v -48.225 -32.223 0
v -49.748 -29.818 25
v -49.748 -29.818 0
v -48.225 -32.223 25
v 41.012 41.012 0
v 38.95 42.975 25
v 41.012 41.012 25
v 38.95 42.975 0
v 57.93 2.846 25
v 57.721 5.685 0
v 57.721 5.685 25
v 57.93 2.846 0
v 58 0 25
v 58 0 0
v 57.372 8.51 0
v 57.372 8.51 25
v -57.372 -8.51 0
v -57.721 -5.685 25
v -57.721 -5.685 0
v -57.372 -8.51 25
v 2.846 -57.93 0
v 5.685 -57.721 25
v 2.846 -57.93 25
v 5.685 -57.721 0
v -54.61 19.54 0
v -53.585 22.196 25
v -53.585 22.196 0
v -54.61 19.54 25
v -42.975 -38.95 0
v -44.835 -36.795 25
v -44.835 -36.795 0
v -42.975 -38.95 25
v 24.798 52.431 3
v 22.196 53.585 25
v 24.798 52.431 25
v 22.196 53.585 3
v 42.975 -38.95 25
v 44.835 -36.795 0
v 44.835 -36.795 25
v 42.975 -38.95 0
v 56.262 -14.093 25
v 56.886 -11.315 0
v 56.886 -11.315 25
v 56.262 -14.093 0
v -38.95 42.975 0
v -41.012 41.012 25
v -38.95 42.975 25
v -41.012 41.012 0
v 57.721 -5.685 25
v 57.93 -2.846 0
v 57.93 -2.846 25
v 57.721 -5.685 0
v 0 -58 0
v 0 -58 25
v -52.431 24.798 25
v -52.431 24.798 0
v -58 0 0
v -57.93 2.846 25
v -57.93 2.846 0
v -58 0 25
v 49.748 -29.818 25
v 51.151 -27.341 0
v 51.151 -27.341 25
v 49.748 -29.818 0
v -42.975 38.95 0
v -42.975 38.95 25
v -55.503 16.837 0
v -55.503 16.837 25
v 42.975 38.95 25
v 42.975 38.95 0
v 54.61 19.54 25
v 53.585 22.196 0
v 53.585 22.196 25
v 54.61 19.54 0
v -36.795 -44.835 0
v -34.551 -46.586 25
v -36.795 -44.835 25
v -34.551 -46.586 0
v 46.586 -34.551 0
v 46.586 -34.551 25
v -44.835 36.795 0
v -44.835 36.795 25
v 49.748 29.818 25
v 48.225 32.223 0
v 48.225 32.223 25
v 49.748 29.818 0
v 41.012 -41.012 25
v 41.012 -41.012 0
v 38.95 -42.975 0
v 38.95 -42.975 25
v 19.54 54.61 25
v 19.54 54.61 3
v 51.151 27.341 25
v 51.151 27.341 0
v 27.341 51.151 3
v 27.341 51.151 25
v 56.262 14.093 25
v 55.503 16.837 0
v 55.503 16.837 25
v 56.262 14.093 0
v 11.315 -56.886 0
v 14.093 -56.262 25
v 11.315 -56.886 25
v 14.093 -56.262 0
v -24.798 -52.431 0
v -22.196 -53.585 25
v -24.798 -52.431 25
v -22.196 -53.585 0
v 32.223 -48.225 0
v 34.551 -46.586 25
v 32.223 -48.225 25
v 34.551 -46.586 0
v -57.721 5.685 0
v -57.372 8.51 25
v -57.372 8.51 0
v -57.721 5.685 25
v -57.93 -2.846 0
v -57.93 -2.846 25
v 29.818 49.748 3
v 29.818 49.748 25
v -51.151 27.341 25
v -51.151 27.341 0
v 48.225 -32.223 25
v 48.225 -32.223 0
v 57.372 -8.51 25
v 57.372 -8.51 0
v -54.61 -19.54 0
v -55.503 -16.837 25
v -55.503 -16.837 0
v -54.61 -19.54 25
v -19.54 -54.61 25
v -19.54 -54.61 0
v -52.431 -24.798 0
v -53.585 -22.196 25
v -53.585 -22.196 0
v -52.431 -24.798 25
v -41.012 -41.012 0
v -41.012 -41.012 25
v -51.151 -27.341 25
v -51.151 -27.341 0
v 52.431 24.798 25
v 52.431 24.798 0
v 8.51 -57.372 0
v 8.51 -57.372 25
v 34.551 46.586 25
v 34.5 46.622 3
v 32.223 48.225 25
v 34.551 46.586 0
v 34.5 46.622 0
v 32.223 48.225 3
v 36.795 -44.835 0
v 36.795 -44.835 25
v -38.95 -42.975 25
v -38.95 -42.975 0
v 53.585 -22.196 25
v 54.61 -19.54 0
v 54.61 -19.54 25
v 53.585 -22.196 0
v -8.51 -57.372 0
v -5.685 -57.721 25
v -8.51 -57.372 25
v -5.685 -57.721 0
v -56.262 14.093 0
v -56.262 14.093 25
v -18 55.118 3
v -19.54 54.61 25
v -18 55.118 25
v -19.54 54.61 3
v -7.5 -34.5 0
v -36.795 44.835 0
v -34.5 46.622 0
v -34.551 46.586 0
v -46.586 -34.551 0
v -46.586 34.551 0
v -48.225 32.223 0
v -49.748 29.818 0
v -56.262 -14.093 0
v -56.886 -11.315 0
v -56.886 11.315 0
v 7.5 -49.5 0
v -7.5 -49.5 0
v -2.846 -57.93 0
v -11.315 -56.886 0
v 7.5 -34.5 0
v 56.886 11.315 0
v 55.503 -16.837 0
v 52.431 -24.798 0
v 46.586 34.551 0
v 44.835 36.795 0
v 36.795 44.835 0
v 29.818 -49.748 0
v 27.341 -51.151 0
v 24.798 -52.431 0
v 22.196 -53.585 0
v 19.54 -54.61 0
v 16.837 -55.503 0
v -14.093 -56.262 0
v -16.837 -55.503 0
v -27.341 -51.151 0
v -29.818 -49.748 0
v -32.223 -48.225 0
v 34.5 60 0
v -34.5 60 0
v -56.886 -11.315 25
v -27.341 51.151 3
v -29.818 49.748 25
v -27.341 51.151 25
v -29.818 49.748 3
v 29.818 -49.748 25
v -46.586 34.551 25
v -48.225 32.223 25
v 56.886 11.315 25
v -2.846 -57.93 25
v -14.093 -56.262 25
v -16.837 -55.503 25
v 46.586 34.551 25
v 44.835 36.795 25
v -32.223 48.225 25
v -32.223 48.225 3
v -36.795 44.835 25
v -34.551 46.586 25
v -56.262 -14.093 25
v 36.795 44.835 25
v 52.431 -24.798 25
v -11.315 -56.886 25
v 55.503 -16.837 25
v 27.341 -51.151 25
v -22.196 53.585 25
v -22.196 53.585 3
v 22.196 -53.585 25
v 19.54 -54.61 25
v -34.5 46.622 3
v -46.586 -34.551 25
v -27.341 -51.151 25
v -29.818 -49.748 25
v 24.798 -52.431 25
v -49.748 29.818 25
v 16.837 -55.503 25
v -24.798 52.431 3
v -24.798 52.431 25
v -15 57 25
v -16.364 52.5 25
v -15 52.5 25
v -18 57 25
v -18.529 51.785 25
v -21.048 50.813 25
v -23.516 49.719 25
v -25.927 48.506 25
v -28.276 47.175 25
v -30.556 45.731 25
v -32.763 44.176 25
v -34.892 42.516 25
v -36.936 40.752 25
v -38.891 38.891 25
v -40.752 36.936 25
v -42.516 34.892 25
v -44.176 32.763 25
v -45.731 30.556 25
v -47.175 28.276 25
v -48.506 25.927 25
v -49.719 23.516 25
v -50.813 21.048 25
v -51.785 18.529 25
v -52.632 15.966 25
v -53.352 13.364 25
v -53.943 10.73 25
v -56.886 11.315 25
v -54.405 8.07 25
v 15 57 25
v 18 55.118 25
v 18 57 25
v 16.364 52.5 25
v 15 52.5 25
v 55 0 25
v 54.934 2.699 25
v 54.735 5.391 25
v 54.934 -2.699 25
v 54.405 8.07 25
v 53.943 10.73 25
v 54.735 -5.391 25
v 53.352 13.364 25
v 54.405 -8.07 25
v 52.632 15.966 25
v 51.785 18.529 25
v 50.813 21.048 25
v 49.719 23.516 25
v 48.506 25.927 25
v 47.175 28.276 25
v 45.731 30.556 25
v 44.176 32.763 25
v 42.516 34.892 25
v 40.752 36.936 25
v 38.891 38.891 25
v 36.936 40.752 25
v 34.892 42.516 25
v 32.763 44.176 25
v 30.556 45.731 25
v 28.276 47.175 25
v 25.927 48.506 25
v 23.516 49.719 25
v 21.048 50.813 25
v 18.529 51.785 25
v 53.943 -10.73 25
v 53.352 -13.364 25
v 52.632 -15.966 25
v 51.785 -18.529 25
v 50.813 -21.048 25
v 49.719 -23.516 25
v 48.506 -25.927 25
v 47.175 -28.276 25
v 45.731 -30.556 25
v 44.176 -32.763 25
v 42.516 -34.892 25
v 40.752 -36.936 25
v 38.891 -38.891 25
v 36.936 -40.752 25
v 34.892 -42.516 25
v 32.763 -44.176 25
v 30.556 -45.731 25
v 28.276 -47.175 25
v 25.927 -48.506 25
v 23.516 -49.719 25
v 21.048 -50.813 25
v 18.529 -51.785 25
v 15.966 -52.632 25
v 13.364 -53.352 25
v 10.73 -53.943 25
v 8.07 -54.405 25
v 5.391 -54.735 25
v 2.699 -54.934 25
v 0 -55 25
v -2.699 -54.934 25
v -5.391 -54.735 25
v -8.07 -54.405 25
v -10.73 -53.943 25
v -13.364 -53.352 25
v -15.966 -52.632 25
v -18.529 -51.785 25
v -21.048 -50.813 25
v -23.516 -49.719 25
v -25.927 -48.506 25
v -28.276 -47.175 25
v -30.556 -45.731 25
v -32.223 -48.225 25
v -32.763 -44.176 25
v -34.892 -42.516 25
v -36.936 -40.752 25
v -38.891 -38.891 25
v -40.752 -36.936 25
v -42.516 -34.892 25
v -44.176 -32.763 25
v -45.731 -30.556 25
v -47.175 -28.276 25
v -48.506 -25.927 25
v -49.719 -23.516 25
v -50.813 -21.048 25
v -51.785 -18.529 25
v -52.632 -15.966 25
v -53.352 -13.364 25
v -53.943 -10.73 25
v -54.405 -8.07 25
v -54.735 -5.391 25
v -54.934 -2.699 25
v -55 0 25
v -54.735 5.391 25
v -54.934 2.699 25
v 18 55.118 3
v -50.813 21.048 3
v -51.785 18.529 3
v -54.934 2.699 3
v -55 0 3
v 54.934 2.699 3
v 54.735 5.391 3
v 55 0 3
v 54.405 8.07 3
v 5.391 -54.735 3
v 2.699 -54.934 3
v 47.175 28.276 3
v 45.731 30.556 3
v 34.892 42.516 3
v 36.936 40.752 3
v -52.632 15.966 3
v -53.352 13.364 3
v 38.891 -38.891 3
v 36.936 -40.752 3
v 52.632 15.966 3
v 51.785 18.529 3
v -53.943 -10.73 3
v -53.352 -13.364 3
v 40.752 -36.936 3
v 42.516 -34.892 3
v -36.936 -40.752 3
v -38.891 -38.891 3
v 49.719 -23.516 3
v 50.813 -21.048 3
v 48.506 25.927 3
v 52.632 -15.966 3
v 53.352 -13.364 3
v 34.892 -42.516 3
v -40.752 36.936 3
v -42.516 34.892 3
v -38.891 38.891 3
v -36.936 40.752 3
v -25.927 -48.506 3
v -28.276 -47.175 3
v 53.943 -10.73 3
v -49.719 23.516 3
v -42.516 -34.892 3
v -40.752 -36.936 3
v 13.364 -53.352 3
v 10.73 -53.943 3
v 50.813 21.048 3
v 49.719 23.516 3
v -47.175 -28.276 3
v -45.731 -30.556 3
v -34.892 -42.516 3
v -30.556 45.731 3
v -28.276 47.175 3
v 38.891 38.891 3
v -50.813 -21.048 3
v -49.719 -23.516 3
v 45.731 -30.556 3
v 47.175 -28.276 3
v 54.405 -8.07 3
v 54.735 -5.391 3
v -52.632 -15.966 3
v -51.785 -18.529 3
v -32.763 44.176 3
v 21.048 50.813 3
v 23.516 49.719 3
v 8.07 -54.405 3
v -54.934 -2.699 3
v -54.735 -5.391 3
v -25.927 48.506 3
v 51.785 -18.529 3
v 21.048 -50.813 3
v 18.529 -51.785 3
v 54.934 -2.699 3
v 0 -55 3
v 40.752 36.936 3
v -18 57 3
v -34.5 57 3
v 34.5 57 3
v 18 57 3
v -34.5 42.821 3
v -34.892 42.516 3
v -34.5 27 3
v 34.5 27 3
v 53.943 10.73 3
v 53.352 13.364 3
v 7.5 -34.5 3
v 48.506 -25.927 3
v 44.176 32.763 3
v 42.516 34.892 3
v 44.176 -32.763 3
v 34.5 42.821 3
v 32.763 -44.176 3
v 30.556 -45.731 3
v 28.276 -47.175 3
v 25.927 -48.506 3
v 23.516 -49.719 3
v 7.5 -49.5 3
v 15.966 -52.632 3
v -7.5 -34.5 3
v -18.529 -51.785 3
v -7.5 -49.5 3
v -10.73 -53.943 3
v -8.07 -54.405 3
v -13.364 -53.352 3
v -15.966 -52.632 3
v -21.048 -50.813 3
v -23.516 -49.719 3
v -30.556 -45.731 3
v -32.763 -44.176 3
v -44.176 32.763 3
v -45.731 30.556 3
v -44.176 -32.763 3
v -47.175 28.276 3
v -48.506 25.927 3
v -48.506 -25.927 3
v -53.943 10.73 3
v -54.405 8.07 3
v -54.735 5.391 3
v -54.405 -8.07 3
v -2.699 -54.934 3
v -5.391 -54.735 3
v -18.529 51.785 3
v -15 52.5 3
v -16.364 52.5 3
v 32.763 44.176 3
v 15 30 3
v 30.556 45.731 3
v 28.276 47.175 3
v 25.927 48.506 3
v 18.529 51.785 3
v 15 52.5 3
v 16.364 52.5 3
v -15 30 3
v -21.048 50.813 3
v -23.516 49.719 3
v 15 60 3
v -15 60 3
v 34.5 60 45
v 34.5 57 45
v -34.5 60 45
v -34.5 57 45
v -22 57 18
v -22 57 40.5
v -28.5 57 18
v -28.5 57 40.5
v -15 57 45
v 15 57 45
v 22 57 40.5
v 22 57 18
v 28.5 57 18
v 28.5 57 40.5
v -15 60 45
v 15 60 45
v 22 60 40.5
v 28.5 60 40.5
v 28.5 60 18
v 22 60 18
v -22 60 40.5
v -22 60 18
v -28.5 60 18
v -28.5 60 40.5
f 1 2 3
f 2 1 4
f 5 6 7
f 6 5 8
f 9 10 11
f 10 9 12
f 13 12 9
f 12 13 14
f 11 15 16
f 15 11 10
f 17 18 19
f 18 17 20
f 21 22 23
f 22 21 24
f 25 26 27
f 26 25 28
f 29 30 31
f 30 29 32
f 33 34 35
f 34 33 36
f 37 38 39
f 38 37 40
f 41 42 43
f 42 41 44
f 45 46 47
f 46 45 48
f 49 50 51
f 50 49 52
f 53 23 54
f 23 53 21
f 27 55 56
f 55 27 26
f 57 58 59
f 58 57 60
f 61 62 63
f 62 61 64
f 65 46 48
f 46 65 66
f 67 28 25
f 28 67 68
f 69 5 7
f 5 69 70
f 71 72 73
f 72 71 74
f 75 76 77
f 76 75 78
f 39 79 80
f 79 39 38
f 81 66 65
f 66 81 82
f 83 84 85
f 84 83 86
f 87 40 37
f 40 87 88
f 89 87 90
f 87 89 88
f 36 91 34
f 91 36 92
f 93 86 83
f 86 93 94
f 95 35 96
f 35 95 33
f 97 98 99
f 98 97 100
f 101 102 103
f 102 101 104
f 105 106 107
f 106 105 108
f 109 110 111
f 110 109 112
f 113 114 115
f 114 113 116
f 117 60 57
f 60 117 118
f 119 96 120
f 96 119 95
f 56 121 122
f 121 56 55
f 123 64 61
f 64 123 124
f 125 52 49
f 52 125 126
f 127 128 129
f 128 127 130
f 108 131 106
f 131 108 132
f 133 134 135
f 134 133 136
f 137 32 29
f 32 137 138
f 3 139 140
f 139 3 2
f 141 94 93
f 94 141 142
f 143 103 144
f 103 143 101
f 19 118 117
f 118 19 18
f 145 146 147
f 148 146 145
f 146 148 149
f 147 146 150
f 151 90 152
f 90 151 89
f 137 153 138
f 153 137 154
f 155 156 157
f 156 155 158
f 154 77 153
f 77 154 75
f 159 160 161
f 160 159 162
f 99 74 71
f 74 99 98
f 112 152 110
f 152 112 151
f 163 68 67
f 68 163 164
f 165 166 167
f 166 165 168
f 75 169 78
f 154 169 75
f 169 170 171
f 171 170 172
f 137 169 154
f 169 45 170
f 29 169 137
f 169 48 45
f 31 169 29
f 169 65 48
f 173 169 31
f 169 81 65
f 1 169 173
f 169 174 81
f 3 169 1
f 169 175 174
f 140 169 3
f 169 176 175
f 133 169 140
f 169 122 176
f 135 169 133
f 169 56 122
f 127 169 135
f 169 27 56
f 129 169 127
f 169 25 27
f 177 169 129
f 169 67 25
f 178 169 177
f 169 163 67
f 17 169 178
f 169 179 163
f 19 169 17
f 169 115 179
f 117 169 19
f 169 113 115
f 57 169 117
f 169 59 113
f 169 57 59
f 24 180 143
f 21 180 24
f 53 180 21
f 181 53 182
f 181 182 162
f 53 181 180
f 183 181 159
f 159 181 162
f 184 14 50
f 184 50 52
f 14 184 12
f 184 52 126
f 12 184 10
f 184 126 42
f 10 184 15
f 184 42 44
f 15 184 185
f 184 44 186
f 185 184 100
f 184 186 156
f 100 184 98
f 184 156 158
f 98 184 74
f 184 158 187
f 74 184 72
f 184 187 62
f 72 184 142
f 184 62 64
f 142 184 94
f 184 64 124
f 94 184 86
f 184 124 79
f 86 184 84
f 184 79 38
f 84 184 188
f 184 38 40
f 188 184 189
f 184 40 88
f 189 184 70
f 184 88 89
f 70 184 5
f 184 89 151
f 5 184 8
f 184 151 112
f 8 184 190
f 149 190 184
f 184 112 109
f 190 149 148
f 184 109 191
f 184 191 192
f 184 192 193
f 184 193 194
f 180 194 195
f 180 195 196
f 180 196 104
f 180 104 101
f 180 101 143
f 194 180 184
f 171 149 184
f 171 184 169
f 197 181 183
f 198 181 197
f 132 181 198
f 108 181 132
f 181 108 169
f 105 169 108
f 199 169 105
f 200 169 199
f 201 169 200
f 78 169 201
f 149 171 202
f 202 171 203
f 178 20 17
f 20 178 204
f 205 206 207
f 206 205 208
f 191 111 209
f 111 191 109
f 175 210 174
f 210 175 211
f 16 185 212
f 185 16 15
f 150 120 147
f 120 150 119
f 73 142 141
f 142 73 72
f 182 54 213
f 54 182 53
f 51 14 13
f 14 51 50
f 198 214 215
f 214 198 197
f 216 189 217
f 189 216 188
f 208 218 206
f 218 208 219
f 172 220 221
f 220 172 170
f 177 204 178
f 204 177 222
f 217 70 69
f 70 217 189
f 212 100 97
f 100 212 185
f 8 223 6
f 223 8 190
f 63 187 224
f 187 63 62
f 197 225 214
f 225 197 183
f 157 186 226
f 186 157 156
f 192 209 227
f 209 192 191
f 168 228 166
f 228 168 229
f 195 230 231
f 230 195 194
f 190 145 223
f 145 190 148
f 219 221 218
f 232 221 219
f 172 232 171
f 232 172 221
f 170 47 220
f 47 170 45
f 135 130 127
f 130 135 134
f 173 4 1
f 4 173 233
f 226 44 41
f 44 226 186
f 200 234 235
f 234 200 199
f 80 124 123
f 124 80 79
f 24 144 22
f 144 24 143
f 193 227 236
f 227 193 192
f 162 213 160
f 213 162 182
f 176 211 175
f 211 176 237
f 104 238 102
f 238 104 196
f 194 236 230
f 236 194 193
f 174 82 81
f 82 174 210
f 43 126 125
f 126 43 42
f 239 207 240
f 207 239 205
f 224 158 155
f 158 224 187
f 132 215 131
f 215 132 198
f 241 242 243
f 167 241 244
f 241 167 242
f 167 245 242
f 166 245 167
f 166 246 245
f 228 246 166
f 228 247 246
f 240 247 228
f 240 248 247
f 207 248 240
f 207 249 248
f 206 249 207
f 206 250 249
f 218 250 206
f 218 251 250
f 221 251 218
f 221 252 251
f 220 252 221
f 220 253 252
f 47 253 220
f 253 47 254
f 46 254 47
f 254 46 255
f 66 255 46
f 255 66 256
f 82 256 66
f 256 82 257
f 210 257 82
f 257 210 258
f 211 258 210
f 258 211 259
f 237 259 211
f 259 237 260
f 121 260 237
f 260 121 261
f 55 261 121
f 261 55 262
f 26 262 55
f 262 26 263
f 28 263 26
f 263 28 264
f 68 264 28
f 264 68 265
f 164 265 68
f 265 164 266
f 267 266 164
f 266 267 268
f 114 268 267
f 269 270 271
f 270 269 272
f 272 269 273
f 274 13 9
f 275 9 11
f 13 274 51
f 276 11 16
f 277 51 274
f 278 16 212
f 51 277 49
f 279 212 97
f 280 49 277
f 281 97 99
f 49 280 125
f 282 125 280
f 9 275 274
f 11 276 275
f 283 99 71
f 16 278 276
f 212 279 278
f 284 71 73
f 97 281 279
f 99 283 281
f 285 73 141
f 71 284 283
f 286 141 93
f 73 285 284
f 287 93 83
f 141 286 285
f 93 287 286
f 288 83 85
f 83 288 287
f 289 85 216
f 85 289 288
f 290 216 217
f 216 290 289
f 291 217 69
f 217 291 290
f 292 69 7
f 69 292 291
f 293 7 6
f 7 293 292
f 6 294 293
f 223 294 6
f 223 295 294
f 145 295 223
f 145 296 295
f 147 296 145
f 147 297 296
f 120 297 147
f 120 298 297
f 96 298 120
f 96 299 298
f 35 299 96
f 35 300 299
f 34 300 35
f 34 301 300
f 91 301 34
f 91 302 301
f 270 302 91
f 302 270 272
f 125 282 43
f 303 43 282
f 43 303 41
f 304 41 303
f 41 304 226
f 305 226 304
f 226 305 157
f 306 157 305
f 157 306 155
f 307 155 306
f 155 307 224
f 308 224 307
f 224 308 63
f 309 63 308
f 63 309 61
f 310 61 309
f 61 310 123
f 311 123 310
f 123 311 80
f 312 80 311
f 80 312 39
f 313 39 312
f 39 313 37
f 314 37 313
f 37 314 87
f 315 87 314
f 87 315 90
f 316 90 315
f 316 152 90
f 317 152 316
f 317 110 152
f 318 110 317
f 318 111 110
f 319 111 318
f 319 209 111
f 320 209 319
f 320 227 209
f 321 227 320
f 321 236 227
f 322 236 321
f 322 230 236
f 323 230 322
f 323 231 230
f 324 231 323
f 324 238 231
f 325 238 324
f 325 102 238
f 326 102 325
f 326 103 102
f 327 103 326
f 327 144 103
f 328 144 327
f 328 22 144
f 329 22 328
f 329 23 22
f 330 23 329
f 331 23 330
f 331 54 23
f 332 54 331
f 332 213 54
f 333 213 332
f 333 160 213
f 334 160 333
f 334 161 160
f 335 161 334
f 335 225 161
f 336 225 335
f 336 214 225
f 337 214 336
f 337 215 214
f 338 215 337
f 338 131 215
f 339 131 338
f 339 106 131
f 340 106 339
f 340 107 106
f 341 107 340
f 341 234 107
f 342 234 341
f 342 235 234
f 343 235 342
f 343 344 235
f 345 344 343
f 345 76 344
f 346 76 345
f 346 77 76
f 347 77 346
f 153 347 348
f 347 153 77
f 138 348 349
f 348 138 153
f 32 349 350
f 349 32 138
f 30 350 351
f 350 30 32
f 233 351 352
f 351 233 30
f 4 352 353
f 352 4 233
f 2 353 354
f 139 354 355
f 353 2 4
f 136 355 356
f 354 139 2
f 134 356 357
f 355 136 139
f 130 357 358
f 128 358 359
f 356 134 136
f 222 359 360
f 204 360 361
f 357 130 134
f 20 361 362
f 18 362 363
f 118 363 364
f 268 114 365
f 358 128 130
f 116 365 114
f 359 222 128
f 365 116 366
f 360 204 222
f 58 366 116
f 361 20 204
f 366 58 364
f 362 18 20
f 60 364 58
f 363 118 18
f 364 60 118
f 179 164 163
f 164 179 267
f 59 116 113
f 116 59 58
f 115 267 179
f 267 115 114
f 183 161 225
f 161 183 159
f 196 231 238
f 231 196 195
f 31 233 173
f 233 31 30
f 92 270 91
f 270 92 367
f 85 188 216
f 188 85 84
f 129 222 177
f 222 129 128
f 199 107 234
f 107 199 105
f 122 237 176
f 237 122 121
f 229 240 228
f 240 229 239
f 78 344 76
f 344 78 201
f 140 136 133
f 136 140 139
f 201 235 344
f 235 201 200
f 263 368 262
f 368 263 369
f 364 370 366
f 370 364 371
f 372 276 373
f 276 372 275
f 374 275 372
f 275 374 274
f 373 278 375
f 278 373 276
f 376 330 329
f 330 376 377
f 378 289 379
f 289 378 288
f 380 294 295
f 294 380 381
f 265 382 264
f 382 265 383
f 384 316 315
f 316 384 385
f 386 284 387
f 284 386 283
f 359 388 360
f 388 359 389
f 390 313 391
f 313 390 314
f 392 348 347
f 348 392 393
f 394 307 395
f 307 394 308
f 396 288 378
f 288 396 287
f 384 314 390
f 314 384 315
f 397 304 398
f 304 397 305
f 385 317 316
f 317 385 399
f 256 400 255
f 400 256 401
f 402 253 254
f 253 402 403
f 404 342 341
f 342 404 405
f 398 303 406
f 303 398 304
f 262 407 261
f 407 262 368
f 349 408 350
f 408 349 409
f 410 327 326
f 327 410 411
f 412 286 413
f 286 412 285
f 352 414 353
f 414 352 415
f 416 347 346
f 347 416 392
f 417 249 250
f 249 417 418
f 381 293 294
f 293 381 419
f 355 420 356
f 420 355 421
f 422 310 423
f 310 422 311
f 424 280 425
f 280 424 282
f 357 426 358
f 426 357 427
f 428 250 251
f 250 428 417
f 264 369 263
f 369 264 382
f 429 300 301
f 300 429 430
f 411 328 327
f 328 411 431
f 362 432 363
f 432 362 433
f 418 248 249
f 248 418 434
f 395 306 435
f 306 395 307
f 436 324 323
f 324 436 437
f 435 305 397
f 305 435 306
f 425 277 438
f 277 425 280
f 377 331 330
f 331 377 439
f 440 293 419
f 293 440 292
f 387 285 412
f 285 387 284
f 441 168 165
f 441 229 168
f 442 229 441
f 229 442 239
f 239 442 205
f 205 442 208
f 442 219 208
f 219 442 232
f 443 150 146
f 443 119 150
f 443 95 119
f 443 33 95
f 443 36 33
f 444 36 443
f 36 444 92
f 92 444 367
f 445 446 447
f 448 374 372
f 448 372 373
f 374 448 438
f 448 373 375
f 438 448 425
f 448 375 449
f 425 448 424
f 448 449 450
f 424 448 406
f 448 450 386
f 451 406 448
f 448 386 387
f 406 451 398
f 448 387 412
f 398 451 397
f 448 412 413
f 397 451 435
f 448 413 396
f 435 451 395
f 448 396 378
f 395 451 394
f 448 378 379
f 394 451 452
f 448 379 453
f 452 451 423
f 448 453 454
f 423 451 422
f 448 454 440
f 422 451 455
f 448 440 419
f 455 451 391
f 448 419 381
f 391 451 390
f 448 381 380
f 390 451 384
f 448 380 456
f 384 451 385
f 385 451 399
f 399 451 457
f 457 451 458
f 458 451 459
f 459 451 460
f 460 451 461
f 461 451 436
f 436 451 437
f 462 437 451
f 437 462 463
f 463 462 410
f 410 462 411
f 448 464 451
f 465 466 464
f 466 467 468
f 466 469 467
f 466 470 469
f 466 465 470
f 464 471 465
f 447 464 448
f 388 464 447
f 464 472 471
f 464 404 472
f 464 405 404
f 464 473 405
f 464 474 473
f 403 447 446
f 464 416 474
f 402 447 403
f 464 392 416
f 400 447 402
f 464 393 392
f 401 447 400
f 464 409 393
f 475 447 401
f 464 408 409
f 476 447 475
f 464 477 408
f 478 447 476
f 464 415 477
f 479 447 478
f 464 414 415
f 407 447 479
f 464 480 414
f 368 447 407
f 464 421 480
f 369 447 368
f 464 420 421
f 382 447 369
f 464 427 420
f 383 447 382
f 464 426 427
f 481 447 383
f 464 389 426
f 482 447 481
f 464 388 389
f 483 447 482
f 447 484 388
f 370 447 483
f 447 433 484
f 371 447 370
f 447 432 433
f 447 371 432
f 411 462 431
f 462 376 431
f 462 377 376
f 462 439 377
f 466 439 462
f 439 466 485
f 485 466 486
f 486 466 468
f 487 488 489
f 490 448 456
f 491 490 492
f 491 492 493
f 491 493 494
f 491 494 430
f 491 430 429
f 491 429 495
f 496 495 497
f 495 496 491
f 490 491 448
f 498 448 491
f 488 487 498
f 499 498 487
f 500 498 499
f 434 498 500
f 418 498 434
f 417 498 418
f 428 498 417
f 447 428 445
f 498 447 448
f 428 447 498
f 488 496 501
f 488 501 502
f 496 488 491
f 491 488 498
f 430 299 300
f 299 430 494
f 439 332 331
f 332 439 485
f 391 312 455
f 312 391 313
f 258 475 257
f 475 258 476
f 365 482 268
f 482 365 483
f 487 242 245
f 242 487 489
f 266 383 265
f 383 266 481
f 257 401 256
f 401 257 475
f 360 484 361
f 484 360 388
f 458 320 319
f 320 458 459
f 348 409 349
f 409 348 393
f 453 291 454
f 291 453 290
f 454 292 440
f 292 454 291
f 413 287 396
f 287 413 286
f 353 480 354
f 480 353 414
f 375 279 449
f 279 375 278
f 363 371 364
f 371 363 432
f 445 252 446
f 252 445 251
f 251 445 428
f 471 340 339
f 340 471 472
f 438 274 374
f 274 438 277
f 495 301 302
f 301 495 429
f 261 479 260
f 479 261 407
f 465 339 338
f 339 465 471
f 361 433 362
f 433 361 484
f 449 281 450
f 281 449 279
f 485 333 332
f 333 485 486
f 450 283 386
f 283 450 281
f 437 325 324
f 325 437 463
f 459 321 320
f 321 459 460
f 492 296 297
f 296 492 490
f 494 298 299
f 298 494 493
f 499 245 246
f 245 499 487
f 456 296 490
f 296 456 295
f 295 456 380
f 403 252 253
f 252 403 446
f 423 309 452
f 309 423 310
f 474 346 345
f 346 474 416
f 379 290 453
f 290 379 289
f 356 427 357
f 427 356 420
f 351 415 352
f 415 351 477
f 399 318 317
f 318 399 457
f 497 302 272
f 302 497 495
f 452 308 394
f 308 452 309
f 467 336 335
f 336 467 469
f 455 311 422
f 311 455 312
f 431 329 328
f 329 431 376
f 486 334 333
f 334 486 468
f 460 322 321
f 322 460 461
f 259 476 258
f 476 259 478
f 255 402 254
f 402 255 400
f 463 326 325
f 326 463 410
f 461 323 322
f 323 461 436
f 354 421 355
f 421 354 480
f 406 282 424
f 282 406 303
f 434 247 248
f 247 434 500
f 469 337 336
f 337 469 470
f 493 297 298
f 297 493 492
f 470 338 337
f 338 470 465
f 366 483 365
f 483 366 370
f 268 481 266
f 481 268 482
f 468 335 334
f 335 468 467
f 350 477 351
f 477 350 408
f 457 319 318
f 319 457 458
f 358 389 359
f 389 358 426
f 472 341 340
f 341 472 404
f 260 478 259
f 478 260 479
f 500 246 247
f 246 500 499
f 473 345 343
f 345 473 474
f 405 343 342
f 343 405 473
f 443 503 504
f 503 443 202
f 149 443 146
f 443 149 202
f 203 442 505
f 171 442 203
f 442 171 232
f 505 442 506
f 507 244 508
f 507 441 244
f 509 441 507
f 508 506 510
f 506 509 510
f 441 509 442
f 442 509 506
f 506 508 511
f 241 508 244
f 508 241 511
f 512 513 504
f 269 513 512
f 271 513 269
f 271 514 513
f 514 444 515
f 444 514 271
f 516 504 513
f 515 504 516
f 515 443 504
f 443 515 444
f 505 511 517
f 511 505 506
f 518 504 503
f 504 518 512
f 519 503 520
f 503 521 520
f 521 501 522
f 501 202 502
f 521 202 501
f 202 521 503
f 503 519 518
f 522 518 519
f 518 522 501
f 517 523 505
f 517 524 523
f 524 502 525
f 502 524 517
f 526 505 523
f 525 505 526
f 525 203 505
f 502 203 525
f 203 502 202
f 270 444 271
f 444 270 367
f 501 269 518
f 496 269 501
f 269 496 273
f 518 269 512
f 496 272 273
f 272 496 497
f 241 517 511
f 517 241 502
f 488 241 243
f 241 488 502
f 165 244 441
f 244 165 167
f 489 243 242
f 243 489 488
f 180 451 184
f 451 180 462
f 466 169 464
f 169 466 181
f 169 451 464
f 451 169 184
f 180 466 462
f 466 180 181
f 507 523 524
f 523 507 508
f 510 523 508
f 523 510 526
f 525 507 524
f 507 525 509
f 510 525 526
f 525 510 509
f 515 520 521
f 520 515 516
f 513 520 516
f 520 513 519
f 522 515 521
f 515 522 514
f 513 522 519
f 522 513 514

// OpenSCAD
fn = 128;
wheel_radius = 102 / 2;
support_width = 30;

mount_inner_edge_to_edge = 44;
mount_outer_edge_to_edge = 57;
mount_width = 6.5;
thickness = 3;
wheel_margin = 4;
mount_total_width = 69;
shield_radius = wheel_radius + wheel_margin;
shield_height = 25;
bridge_length = 30;
bridge_offset = 9 - wheel_margin;
bridge_y_offset = (shield_radius - bridge_length +
                   bridge_offset - thickness);
v_mount_y_offset = shield_radius + bridge_offset - thickness;
v_mount_height = 45;
mount_space_y_offset = (v_mount_y_offset -
                        bridge_length +
                        thickness);
aperture_size = 15;
aperture_offset = 42;

rebar_len = 4.5;

module shield() {
  union() {
    difference() {
      cylinder(h = shield_height,
               r1 = shield_radius+thickness,
               r2 = shield_radius+thickness, $fn=fn);
      translate([0, 0, thickness])
      cylinder(h = shield_height,
         r1 = shield_radius,
         r2 = shield_radius, $fn=fn);
    }

    translate([-mount_total_width/2, bridge_y_offset, 0])
    cube(size = [mount_total_width, bridge_length, thickness]);
    translate([-mount_total_width/2, v_mount_y_offset, 0])
    cube(size = [mount_total_width, thickness, v_mount_height]);
    translate([support_width/2, v_mount_y_offset-rebar_len, 0])
    cube(size = [thickness, rebar_len, shield_height]);
    translate([-support_width/2-thickness, v_mount_y_offset-rebar_len, 0])
    cube(size = [thickness, rebar_len, shield_height]);
  }
}

module apertures() {
  translate([-support_width/2,
             mount_space_y_offset,
             thickness])
  cube(size = [support_width, bridge_length, v_mount_height]);
  translate([-aperture_size/2,
             -aperture_size/2 - aperture_offset,
             -v_mount_height/2])
  cube(size = [aperture_size, aperture_size, v_mount_height]);
  translate([-mount_width/2 - mount_inner_edge_to_edge/2 - mount_width/2,
             -mount_width/2 + v_mount_y_offset, thickness + v_mount_height/3])
  cube(size = [mount_width, mount_width, v_mount_height/2]);
  translate([-mount_width/2 + mount_inner_edge_to_edge/2 + mount_width/2,
             -mount_width/2 + v_mount_y_offset, thickness + v_mount_height/3])
  cube(size = [mount_width, mount_width, v_mount_height/2]);  
}

module render() {
  difference() {
    shield();
    apertures();
  }
}

echo(version=version());
render();
